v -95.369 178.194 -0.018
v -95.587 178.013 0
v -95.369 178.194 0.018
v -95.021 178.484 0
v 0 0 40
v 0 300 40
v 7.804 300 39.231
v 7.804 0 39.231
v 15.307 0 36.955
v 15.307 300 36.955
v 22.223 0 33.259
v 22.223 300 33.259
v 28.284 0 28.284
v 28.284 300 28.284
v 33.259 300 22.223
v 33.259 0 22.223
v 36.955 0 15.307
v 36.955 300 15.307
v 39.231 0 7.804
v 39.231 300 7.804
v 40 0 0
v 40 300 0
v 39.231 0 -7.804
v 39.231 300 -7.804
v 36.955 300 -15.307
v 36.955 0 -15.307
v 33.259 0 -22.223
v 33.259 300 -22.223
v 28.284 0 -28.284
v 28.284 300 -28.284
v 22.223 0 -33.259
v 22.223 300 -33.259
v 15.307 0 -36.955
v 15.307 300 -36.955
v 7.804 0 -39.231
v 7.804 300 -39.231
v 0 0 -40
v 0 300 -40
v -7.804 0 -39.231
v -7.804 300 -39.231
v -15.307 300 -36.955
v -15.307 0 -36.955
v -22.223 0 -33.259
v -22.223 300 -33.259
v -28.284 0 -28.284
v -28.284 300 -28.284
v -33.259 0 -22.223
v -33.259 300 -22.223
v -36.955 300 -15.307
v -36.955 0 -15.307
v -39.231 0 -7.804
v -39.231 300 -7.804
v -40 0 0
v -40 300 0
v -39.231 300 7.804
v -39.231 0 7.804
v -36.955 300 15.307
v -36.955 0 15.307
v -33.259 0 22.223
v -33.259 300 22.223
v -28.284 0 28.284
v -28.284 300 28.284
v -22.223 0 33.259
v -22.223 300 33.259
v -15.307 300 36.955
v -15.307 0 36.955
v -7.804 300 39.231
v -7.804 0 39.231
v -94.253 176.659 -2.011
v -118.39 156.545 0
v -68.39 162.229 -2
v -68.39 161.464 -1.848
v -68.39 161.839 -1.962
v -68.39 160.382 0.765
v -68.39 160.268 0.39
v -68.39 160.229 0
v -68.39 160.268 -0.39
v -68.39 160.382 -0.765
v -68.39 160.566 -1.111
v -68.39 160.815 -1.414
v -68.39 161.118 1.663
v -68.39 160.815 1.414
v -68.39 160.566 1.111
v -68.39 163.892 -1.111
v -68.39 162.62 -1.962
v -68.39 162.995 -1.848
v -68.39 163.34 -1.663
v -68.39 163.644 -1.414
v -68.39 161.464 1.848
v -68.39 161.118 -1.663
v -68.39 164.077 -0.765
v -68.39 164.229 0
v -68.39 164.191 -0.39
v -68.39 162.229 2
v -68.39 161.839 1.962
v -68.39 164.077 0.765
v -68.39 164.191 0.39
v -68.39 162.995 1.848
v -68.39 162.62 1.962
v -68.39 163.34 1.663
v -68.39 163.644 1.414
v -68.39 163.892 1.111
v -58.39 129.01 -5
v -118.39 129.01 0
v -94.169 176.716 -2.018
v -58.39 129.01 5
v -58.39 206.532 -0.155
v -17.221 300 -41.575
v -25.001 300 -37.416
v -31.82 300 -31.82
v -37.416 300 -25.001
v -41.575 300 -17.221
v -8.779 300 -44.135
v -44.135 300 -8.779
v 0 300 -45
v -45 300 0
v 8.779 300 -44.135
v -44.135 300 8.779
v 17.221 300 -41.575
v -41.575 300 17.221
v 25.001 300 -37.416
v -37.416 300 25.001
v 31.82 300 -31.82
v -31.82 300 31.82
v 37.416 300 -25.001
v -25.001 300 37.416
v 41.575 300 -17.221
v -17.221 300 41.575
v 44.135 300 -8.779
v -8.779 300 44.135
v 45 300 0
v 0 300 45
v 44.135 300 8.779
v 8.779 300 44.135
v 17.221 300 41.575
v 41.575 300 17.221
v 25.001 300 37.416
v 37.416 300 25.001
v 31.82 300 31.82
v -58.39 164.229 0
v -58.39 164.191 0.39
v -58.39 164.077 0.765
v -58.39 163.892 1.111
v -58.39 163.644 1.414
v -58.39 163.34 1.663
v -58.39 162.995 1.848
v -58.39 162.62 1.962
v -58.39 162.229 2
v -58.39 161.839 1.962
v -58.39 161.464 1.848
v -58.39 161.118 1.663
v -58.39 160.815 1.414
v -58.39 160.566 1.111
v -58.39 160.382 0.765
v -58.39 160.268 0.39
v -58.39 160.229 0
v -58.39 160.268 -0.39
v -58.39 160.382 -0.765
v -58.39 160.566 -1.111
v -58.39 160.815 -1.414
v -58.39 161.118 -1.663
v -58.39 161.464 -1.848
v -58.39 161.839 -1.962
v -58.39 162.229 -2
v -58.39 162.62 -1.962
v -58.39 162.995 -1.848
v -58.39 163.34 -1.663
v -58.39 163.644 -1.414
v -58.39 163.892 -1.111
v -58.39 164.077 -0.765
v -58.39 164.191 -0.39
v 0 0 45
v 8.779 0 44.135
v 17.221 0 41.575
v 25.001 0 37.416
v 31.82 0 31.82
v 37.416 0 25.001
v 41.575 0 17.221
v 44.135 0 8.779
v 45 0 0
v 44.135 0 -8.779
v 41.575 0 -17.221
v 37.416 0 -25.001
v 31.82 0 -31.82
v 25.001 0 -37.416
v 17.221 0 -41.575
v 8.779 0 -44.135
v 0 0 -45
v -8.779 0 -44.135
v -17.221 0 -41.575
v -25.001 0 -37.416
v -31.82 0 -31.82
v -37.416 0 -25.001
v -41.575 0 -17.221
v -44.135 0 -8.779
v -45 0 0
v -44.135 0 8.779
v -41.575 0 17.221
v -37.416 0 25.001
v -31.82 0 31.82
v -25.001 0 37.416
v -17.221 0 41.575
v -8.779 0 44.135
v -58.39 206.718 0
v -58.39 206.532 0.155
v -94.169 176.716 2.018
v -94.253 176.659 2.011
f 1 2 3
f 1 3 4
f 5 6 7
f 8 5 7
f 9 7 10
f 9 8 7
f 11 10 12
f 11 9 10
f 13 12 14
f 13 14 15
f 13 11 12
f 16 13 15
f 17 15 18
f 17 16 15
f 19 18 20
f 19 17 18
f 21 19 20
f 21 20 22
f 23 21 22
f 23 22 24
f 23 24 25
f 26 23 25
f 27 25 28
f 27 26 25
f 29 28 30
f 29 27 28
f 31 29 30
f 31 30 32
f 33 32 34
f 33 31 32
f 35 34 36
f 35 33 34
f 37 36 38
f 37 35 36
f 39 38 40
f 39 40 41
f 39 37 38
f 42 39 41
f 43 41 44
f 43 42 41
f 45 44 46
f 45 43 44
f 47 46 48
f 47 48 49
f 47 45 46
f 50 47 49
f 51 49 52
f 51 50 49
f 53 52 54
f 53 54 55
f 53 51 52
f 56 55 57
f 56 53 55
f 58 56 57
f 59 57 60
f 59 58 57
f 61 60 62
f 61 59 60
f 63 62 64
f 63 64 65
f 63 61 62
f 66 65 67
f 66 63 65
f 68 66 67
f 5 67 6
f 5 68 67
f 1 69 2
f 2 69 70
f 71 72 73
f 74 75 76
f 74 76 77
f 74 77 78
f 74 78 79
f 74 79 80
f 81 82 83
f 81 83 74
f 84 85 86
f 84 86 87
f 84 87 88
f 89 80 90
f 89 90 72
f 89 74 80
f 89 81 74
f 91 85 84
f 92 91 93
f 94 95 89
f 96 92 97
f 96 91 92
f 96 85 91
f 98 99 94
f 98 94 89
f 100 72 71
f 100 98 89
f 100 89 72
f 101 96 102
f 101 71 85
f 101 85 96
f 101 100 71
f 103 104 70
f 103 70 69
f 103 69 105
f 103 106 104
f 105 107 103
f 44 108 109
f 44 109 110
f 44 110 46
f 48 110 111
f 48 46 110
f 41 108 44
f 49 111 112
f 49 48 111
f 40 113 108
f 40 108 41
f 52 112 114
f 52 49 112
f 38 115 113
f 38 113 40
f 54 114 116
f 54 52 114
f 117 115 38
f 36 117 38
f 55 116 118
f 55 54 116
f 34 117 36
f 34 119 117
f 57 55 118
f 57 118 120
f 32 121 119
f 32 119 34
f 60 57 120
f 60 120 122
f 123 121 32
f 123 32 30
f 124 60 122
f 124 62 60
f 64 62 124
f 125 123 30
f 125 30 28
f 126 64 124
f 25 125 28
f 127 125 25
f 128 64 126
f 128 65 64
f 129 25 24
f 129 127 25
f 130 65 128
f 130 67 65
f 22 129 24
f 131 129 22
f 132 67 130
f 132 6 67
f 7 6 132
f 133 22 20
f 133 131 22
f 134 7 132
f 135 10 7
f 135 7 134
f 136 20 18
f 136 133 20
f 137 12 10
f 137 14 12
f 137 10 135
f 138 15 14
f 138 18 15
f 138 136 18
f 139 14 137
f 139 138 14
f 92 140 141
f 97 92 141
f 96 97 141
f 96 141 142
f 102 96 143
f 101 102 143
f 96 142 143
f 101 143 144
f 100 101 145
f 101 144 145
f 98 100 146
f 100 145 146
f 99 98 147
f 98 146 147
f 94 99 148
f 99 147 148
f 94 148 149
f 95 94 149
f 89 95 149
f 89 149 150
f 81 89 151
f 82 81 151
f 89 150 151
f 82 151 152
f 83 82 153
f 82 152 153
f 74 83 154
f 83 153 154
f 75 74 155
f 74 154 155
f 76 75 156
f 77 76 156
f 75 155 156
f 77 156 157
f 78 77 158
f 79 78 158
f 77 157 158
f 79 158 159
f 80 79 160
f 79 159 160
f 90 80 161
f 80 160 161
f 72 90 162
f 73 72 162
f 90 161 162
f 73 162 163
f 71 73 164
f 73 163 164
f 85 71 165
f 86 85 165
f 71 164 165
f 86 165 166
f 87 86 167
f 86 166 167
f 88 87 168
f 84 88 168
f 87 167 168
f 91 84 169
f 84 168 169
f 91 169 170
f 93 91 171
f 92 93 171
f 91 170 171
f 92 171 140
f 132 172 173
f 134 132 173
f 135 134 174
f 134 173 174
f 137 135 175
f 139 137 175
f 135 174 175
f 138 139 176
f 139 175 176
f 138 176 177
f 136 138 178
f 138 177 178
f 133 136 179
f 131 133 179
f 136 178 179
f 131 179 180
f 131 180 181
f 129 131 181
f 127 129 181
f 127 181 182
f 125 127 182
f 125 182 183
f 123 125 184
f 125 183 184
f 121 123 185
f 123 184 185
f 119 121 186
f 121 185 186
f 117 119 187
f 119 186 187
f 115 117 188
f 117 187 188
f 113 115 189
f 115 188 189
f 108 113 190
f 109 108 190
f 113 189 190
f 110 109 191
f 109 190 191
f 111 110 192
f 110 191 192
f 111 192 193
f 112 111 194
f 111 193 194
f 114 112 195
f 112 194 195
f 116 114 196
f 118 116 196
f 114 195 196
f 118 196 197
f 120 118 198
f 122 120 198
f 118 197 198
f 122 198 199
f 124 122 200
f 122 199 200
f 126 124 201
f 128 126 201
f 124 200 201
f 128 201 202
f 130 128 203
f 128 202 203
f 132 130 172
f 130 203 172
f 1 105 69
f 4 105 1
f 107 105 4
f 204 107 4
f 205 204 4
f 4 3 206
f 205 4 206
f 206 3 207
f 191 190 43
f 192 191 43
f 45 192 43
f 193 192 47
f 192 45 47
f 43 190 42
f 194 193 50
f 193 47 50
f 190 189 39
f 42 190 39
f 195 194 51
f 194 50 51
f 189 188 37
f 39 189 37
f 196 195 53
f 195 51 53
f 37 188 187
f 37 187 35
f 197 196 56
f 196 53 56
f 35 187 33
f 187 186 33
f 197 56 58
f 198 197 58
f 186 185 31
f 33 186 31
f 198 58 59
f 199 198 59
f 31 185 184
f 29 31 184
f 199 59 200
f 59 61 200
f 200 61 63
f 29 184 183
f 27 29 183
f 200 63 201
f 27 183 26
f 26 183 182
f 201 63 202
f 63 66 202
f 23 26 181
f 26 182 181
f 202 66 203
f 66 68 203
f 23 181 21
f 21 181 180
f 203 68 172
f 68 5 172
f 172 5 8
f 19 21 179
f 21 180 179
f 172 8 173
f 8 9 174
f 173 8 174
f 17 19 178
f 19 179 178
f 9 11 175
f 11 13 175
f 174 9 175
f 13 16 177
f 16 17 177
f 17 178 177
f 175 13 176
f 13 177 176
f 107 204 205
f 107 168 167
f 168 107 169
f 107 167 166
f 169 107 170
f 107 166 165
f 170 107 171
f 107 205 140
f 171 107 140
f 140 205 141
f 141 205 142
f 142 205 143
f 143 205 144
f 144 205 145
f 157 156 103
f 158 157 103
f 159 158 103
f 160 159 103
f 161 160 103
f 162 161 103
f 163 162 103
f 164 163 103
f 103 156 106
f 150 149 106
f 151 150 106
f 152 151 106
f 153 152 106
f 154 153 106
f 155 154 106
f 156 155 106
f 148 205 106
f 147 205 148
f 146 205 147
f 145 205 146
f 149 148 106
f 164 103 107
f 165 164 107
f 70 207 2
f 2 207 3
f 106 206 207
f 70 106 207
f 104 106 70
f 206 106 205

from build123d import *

# Parameters (mm, degrees)
SKETCH5_R           = 45
SKETCH5_R_2         = 40
BOSS_EXTRUDE6_DEPTH = 300
BOSS_EXTRUDE7_DEPTH = 5
SKETCH7_OUTSIDE_W   = 162.654
SKETCH7_OUTSIDE_H   = 372.654
CUT_EXTRUDE2_DEPTH  = 60
SKETCH8_OUTSIDE_W   = 236.044
SKETCH8_OUTSIDE_H   = 162.654
CUT_EXTRUDE4_DEPTH  = 63.333333
SKETCH9_R           = 2
CUT_EXTRUDE5_DEPTH  = 10


with BuildPart() as part:
    # Sketch5 → Boss-Extrude6 (new body)
    with BuildSketch(Plane(origin=(0, 0, 0), x_dir=(1, 0, 0), z_dir=(0, 1, 0))):
        with Locations(Location((0, 0, 0), (0, 0, 270))):
            Circle(SKETCH5_R)
        with Locations(Location((0, 0, 0), (0, 0, 270))):
            Circle(SKETCH5_R_2, mode=Mode.SUBTRACT)
    extrude(amount=BOSS_EXTRUDE6_DEPTH)


with BuildPart() as body_2:
    # Sketch6 → Boss-Extrude7 (new, symmetric)
    with BuildSketch(Plane.XY):
        Polygon((-58.389869674, 209.010177568), (-58.389869674, 129.010177568), (-118.389869674, 129.010177568), (-118.389869674, 159.010177568), align=None)
    extrude(amount=BOSS_EXTRUDE7_DEPTH, both=True)

    # Sketch7 outside → Cut-Extrude2 (cut)
    with BuildSketch(Plane(origin=(-58.389869674, 0, 0), x_dir=(0, 0, -1), z_dir=(1, 0, 0))):
        with Locations((0, 150)):
            Rectangle(SKETCH7_OUTSIDE_W, SKETCH7_OUTSIDE_H)
        Polygon((-5, 129.010177568), (0, 209.010177568), (5, 129.010177568), align=None, mode=Mode.SUBTRACT)
    extrude(amount=-CUT_EXTRUDE2_DEPTH, mode=Mode.SUBTRACT)

    # Sketch8 outside → Cut-Extrude4 (cut)
    with BuildSketch(Plane.XZ.offset(-129.010177568)):
        with Locations((-36.695, 0)):
            Rectangle(SKETCH8_OUTSIDE_W, SKETCH8_OUTSIDE_H)
        Polygon((-58.389869674, 5), (-118.389869674, 0), (-58.389869674, -5), align=None, mode=Mode.SUBTRACT)
    extrude(amount=-CUT_EXTRUDE4_DEPTH, mode=Mode.SUBTRACT)

    # Chamfer1
    # the kernel refuses this chamfer: 2 mm, written as the material it takes off along each edge
    with BuildSketch(Plane(origin=(-54.61893677, 212.152621655, 0.196402755), x_dir=(0.6406678172597216, -0.7640577696348805, -0.07589777722855967), z_dir=(-0.7676070857324205, -0.6396725714436841, -0.03997953571523024))) as chamfer1_piece_1:
        with BuildLine():
            Line((1.965032879, 0), (-0.204239114, 1.954390084))
            Line((-0.204239114, 1.954390084), (-0.244123554, 1.951351743))
            ThreePointArc((-0.244123554, 1.951351743), (-0.114485472, 0.976253024), (-0.039884439, -0.00303834))
            Line((-0.039884439, -0.00303834), (0.001123574, -0.039984217))
            ThreePointArc((0.001123574, -0.039984217), (0.982864796, -0.01239685), (1.966156453, -0.039984217))
            Line((1.966156453, -0.039984217), (1.965032879, 0))
        make_face()
    extrude(amount=57.926696558, mode=Mode.SUBTRACT)
    with BuildSketch(Plane(origin=(-99.083879501, 175.098502712, 2.119479678), x_dir=(-0.04868338001269826, -0.004005333382546194, -0.9988062303645456), z_dir=(0.7676070857324205, 0.6396725714436841, -0.03997953571523024))) as chamfer1_piece_2:
        with BuildLine():
            Line((1.965032879, 0), (-0.204239114, -1.954390084))
            Line((-0.204239114, -1.954390084), (-0.244123554, -1.951351743))
            ThreePointArc((-0.244123554, -1.951351743), (-0.114485472, -0.976253024), (-0.039884439, 0.00303834))
            Line((-0.039884439, 0.00303834), (0.001123574, 0.039984217))
            ThreePointArc((0.001123574, 0.039984217), (0.982864796, 0.01239685), (1.966156453, 0.039984217))
            Line((1.966156453, 0.039984217), (1.965032879, 0))
        make_face()
    extrude(amount=57.926696558, mode=Mode.SUBTRACT)
    with BuildSketch(Plane(origin=(-122.137227268, 155.887379573, 0.3122798), x_dir=(0.6340793876319524, -0.7690043228353277, -0.08109057676985179), z_dir=(0.7666518779999277, 0.63887656499994, -0.06388765649999398)), Plane(origin=(-91.565589003, 181.363744794, 2.235356723), x_dir=(0.6340793876319524, -0.7690043228353278, 0.0810905767698521), z_dir=(-0.7666518779999277, -0.63887656499994, -0.06388765649999398))) as chamfer1_piece_3:
        with BuildLine():
            Line((1.955180807, 0), (-0.213670596, -1.943470315))
            Line((-0.213670596, -1.943470315), (-0.253538324, -1.940220052))
            ThreePointArc((-0.253538324, -1.940220052), (-0.119271891, -0.97072125), (-0.039867729, 0.003250263))
            Line((-0.039867729, 0.003250263), (0.001126122, 0.039984145))
            ThreePointArc((0.001126122, 0.039984145), (0.977941693, 0.012472909), (1.956306929, 0.039984145))
            Line((1.956306929, 0.039984145), (1.955180807, 0))
        make_face()
    extrude(amount=39.876819118, mode=Mode.SUBTRACT)

    # Sketch9 → Cut-Extrude5 (cut)
    with BuildSketch(Plane(origin=(-58.389869674, 0, 0), x_dir=(0, 0, -1), z_dir=(1, 0, 0))):
        with Locations(Location((0, 162.229328702, 0), (0, 0, 90))):
            Circle(SKETCH9_R)
    extrude(amount=-CUT_EXTRUDE5_DEPTH, mode=Mode.SUBTRACT)


solid = Compound([part.part, body_2.part])
